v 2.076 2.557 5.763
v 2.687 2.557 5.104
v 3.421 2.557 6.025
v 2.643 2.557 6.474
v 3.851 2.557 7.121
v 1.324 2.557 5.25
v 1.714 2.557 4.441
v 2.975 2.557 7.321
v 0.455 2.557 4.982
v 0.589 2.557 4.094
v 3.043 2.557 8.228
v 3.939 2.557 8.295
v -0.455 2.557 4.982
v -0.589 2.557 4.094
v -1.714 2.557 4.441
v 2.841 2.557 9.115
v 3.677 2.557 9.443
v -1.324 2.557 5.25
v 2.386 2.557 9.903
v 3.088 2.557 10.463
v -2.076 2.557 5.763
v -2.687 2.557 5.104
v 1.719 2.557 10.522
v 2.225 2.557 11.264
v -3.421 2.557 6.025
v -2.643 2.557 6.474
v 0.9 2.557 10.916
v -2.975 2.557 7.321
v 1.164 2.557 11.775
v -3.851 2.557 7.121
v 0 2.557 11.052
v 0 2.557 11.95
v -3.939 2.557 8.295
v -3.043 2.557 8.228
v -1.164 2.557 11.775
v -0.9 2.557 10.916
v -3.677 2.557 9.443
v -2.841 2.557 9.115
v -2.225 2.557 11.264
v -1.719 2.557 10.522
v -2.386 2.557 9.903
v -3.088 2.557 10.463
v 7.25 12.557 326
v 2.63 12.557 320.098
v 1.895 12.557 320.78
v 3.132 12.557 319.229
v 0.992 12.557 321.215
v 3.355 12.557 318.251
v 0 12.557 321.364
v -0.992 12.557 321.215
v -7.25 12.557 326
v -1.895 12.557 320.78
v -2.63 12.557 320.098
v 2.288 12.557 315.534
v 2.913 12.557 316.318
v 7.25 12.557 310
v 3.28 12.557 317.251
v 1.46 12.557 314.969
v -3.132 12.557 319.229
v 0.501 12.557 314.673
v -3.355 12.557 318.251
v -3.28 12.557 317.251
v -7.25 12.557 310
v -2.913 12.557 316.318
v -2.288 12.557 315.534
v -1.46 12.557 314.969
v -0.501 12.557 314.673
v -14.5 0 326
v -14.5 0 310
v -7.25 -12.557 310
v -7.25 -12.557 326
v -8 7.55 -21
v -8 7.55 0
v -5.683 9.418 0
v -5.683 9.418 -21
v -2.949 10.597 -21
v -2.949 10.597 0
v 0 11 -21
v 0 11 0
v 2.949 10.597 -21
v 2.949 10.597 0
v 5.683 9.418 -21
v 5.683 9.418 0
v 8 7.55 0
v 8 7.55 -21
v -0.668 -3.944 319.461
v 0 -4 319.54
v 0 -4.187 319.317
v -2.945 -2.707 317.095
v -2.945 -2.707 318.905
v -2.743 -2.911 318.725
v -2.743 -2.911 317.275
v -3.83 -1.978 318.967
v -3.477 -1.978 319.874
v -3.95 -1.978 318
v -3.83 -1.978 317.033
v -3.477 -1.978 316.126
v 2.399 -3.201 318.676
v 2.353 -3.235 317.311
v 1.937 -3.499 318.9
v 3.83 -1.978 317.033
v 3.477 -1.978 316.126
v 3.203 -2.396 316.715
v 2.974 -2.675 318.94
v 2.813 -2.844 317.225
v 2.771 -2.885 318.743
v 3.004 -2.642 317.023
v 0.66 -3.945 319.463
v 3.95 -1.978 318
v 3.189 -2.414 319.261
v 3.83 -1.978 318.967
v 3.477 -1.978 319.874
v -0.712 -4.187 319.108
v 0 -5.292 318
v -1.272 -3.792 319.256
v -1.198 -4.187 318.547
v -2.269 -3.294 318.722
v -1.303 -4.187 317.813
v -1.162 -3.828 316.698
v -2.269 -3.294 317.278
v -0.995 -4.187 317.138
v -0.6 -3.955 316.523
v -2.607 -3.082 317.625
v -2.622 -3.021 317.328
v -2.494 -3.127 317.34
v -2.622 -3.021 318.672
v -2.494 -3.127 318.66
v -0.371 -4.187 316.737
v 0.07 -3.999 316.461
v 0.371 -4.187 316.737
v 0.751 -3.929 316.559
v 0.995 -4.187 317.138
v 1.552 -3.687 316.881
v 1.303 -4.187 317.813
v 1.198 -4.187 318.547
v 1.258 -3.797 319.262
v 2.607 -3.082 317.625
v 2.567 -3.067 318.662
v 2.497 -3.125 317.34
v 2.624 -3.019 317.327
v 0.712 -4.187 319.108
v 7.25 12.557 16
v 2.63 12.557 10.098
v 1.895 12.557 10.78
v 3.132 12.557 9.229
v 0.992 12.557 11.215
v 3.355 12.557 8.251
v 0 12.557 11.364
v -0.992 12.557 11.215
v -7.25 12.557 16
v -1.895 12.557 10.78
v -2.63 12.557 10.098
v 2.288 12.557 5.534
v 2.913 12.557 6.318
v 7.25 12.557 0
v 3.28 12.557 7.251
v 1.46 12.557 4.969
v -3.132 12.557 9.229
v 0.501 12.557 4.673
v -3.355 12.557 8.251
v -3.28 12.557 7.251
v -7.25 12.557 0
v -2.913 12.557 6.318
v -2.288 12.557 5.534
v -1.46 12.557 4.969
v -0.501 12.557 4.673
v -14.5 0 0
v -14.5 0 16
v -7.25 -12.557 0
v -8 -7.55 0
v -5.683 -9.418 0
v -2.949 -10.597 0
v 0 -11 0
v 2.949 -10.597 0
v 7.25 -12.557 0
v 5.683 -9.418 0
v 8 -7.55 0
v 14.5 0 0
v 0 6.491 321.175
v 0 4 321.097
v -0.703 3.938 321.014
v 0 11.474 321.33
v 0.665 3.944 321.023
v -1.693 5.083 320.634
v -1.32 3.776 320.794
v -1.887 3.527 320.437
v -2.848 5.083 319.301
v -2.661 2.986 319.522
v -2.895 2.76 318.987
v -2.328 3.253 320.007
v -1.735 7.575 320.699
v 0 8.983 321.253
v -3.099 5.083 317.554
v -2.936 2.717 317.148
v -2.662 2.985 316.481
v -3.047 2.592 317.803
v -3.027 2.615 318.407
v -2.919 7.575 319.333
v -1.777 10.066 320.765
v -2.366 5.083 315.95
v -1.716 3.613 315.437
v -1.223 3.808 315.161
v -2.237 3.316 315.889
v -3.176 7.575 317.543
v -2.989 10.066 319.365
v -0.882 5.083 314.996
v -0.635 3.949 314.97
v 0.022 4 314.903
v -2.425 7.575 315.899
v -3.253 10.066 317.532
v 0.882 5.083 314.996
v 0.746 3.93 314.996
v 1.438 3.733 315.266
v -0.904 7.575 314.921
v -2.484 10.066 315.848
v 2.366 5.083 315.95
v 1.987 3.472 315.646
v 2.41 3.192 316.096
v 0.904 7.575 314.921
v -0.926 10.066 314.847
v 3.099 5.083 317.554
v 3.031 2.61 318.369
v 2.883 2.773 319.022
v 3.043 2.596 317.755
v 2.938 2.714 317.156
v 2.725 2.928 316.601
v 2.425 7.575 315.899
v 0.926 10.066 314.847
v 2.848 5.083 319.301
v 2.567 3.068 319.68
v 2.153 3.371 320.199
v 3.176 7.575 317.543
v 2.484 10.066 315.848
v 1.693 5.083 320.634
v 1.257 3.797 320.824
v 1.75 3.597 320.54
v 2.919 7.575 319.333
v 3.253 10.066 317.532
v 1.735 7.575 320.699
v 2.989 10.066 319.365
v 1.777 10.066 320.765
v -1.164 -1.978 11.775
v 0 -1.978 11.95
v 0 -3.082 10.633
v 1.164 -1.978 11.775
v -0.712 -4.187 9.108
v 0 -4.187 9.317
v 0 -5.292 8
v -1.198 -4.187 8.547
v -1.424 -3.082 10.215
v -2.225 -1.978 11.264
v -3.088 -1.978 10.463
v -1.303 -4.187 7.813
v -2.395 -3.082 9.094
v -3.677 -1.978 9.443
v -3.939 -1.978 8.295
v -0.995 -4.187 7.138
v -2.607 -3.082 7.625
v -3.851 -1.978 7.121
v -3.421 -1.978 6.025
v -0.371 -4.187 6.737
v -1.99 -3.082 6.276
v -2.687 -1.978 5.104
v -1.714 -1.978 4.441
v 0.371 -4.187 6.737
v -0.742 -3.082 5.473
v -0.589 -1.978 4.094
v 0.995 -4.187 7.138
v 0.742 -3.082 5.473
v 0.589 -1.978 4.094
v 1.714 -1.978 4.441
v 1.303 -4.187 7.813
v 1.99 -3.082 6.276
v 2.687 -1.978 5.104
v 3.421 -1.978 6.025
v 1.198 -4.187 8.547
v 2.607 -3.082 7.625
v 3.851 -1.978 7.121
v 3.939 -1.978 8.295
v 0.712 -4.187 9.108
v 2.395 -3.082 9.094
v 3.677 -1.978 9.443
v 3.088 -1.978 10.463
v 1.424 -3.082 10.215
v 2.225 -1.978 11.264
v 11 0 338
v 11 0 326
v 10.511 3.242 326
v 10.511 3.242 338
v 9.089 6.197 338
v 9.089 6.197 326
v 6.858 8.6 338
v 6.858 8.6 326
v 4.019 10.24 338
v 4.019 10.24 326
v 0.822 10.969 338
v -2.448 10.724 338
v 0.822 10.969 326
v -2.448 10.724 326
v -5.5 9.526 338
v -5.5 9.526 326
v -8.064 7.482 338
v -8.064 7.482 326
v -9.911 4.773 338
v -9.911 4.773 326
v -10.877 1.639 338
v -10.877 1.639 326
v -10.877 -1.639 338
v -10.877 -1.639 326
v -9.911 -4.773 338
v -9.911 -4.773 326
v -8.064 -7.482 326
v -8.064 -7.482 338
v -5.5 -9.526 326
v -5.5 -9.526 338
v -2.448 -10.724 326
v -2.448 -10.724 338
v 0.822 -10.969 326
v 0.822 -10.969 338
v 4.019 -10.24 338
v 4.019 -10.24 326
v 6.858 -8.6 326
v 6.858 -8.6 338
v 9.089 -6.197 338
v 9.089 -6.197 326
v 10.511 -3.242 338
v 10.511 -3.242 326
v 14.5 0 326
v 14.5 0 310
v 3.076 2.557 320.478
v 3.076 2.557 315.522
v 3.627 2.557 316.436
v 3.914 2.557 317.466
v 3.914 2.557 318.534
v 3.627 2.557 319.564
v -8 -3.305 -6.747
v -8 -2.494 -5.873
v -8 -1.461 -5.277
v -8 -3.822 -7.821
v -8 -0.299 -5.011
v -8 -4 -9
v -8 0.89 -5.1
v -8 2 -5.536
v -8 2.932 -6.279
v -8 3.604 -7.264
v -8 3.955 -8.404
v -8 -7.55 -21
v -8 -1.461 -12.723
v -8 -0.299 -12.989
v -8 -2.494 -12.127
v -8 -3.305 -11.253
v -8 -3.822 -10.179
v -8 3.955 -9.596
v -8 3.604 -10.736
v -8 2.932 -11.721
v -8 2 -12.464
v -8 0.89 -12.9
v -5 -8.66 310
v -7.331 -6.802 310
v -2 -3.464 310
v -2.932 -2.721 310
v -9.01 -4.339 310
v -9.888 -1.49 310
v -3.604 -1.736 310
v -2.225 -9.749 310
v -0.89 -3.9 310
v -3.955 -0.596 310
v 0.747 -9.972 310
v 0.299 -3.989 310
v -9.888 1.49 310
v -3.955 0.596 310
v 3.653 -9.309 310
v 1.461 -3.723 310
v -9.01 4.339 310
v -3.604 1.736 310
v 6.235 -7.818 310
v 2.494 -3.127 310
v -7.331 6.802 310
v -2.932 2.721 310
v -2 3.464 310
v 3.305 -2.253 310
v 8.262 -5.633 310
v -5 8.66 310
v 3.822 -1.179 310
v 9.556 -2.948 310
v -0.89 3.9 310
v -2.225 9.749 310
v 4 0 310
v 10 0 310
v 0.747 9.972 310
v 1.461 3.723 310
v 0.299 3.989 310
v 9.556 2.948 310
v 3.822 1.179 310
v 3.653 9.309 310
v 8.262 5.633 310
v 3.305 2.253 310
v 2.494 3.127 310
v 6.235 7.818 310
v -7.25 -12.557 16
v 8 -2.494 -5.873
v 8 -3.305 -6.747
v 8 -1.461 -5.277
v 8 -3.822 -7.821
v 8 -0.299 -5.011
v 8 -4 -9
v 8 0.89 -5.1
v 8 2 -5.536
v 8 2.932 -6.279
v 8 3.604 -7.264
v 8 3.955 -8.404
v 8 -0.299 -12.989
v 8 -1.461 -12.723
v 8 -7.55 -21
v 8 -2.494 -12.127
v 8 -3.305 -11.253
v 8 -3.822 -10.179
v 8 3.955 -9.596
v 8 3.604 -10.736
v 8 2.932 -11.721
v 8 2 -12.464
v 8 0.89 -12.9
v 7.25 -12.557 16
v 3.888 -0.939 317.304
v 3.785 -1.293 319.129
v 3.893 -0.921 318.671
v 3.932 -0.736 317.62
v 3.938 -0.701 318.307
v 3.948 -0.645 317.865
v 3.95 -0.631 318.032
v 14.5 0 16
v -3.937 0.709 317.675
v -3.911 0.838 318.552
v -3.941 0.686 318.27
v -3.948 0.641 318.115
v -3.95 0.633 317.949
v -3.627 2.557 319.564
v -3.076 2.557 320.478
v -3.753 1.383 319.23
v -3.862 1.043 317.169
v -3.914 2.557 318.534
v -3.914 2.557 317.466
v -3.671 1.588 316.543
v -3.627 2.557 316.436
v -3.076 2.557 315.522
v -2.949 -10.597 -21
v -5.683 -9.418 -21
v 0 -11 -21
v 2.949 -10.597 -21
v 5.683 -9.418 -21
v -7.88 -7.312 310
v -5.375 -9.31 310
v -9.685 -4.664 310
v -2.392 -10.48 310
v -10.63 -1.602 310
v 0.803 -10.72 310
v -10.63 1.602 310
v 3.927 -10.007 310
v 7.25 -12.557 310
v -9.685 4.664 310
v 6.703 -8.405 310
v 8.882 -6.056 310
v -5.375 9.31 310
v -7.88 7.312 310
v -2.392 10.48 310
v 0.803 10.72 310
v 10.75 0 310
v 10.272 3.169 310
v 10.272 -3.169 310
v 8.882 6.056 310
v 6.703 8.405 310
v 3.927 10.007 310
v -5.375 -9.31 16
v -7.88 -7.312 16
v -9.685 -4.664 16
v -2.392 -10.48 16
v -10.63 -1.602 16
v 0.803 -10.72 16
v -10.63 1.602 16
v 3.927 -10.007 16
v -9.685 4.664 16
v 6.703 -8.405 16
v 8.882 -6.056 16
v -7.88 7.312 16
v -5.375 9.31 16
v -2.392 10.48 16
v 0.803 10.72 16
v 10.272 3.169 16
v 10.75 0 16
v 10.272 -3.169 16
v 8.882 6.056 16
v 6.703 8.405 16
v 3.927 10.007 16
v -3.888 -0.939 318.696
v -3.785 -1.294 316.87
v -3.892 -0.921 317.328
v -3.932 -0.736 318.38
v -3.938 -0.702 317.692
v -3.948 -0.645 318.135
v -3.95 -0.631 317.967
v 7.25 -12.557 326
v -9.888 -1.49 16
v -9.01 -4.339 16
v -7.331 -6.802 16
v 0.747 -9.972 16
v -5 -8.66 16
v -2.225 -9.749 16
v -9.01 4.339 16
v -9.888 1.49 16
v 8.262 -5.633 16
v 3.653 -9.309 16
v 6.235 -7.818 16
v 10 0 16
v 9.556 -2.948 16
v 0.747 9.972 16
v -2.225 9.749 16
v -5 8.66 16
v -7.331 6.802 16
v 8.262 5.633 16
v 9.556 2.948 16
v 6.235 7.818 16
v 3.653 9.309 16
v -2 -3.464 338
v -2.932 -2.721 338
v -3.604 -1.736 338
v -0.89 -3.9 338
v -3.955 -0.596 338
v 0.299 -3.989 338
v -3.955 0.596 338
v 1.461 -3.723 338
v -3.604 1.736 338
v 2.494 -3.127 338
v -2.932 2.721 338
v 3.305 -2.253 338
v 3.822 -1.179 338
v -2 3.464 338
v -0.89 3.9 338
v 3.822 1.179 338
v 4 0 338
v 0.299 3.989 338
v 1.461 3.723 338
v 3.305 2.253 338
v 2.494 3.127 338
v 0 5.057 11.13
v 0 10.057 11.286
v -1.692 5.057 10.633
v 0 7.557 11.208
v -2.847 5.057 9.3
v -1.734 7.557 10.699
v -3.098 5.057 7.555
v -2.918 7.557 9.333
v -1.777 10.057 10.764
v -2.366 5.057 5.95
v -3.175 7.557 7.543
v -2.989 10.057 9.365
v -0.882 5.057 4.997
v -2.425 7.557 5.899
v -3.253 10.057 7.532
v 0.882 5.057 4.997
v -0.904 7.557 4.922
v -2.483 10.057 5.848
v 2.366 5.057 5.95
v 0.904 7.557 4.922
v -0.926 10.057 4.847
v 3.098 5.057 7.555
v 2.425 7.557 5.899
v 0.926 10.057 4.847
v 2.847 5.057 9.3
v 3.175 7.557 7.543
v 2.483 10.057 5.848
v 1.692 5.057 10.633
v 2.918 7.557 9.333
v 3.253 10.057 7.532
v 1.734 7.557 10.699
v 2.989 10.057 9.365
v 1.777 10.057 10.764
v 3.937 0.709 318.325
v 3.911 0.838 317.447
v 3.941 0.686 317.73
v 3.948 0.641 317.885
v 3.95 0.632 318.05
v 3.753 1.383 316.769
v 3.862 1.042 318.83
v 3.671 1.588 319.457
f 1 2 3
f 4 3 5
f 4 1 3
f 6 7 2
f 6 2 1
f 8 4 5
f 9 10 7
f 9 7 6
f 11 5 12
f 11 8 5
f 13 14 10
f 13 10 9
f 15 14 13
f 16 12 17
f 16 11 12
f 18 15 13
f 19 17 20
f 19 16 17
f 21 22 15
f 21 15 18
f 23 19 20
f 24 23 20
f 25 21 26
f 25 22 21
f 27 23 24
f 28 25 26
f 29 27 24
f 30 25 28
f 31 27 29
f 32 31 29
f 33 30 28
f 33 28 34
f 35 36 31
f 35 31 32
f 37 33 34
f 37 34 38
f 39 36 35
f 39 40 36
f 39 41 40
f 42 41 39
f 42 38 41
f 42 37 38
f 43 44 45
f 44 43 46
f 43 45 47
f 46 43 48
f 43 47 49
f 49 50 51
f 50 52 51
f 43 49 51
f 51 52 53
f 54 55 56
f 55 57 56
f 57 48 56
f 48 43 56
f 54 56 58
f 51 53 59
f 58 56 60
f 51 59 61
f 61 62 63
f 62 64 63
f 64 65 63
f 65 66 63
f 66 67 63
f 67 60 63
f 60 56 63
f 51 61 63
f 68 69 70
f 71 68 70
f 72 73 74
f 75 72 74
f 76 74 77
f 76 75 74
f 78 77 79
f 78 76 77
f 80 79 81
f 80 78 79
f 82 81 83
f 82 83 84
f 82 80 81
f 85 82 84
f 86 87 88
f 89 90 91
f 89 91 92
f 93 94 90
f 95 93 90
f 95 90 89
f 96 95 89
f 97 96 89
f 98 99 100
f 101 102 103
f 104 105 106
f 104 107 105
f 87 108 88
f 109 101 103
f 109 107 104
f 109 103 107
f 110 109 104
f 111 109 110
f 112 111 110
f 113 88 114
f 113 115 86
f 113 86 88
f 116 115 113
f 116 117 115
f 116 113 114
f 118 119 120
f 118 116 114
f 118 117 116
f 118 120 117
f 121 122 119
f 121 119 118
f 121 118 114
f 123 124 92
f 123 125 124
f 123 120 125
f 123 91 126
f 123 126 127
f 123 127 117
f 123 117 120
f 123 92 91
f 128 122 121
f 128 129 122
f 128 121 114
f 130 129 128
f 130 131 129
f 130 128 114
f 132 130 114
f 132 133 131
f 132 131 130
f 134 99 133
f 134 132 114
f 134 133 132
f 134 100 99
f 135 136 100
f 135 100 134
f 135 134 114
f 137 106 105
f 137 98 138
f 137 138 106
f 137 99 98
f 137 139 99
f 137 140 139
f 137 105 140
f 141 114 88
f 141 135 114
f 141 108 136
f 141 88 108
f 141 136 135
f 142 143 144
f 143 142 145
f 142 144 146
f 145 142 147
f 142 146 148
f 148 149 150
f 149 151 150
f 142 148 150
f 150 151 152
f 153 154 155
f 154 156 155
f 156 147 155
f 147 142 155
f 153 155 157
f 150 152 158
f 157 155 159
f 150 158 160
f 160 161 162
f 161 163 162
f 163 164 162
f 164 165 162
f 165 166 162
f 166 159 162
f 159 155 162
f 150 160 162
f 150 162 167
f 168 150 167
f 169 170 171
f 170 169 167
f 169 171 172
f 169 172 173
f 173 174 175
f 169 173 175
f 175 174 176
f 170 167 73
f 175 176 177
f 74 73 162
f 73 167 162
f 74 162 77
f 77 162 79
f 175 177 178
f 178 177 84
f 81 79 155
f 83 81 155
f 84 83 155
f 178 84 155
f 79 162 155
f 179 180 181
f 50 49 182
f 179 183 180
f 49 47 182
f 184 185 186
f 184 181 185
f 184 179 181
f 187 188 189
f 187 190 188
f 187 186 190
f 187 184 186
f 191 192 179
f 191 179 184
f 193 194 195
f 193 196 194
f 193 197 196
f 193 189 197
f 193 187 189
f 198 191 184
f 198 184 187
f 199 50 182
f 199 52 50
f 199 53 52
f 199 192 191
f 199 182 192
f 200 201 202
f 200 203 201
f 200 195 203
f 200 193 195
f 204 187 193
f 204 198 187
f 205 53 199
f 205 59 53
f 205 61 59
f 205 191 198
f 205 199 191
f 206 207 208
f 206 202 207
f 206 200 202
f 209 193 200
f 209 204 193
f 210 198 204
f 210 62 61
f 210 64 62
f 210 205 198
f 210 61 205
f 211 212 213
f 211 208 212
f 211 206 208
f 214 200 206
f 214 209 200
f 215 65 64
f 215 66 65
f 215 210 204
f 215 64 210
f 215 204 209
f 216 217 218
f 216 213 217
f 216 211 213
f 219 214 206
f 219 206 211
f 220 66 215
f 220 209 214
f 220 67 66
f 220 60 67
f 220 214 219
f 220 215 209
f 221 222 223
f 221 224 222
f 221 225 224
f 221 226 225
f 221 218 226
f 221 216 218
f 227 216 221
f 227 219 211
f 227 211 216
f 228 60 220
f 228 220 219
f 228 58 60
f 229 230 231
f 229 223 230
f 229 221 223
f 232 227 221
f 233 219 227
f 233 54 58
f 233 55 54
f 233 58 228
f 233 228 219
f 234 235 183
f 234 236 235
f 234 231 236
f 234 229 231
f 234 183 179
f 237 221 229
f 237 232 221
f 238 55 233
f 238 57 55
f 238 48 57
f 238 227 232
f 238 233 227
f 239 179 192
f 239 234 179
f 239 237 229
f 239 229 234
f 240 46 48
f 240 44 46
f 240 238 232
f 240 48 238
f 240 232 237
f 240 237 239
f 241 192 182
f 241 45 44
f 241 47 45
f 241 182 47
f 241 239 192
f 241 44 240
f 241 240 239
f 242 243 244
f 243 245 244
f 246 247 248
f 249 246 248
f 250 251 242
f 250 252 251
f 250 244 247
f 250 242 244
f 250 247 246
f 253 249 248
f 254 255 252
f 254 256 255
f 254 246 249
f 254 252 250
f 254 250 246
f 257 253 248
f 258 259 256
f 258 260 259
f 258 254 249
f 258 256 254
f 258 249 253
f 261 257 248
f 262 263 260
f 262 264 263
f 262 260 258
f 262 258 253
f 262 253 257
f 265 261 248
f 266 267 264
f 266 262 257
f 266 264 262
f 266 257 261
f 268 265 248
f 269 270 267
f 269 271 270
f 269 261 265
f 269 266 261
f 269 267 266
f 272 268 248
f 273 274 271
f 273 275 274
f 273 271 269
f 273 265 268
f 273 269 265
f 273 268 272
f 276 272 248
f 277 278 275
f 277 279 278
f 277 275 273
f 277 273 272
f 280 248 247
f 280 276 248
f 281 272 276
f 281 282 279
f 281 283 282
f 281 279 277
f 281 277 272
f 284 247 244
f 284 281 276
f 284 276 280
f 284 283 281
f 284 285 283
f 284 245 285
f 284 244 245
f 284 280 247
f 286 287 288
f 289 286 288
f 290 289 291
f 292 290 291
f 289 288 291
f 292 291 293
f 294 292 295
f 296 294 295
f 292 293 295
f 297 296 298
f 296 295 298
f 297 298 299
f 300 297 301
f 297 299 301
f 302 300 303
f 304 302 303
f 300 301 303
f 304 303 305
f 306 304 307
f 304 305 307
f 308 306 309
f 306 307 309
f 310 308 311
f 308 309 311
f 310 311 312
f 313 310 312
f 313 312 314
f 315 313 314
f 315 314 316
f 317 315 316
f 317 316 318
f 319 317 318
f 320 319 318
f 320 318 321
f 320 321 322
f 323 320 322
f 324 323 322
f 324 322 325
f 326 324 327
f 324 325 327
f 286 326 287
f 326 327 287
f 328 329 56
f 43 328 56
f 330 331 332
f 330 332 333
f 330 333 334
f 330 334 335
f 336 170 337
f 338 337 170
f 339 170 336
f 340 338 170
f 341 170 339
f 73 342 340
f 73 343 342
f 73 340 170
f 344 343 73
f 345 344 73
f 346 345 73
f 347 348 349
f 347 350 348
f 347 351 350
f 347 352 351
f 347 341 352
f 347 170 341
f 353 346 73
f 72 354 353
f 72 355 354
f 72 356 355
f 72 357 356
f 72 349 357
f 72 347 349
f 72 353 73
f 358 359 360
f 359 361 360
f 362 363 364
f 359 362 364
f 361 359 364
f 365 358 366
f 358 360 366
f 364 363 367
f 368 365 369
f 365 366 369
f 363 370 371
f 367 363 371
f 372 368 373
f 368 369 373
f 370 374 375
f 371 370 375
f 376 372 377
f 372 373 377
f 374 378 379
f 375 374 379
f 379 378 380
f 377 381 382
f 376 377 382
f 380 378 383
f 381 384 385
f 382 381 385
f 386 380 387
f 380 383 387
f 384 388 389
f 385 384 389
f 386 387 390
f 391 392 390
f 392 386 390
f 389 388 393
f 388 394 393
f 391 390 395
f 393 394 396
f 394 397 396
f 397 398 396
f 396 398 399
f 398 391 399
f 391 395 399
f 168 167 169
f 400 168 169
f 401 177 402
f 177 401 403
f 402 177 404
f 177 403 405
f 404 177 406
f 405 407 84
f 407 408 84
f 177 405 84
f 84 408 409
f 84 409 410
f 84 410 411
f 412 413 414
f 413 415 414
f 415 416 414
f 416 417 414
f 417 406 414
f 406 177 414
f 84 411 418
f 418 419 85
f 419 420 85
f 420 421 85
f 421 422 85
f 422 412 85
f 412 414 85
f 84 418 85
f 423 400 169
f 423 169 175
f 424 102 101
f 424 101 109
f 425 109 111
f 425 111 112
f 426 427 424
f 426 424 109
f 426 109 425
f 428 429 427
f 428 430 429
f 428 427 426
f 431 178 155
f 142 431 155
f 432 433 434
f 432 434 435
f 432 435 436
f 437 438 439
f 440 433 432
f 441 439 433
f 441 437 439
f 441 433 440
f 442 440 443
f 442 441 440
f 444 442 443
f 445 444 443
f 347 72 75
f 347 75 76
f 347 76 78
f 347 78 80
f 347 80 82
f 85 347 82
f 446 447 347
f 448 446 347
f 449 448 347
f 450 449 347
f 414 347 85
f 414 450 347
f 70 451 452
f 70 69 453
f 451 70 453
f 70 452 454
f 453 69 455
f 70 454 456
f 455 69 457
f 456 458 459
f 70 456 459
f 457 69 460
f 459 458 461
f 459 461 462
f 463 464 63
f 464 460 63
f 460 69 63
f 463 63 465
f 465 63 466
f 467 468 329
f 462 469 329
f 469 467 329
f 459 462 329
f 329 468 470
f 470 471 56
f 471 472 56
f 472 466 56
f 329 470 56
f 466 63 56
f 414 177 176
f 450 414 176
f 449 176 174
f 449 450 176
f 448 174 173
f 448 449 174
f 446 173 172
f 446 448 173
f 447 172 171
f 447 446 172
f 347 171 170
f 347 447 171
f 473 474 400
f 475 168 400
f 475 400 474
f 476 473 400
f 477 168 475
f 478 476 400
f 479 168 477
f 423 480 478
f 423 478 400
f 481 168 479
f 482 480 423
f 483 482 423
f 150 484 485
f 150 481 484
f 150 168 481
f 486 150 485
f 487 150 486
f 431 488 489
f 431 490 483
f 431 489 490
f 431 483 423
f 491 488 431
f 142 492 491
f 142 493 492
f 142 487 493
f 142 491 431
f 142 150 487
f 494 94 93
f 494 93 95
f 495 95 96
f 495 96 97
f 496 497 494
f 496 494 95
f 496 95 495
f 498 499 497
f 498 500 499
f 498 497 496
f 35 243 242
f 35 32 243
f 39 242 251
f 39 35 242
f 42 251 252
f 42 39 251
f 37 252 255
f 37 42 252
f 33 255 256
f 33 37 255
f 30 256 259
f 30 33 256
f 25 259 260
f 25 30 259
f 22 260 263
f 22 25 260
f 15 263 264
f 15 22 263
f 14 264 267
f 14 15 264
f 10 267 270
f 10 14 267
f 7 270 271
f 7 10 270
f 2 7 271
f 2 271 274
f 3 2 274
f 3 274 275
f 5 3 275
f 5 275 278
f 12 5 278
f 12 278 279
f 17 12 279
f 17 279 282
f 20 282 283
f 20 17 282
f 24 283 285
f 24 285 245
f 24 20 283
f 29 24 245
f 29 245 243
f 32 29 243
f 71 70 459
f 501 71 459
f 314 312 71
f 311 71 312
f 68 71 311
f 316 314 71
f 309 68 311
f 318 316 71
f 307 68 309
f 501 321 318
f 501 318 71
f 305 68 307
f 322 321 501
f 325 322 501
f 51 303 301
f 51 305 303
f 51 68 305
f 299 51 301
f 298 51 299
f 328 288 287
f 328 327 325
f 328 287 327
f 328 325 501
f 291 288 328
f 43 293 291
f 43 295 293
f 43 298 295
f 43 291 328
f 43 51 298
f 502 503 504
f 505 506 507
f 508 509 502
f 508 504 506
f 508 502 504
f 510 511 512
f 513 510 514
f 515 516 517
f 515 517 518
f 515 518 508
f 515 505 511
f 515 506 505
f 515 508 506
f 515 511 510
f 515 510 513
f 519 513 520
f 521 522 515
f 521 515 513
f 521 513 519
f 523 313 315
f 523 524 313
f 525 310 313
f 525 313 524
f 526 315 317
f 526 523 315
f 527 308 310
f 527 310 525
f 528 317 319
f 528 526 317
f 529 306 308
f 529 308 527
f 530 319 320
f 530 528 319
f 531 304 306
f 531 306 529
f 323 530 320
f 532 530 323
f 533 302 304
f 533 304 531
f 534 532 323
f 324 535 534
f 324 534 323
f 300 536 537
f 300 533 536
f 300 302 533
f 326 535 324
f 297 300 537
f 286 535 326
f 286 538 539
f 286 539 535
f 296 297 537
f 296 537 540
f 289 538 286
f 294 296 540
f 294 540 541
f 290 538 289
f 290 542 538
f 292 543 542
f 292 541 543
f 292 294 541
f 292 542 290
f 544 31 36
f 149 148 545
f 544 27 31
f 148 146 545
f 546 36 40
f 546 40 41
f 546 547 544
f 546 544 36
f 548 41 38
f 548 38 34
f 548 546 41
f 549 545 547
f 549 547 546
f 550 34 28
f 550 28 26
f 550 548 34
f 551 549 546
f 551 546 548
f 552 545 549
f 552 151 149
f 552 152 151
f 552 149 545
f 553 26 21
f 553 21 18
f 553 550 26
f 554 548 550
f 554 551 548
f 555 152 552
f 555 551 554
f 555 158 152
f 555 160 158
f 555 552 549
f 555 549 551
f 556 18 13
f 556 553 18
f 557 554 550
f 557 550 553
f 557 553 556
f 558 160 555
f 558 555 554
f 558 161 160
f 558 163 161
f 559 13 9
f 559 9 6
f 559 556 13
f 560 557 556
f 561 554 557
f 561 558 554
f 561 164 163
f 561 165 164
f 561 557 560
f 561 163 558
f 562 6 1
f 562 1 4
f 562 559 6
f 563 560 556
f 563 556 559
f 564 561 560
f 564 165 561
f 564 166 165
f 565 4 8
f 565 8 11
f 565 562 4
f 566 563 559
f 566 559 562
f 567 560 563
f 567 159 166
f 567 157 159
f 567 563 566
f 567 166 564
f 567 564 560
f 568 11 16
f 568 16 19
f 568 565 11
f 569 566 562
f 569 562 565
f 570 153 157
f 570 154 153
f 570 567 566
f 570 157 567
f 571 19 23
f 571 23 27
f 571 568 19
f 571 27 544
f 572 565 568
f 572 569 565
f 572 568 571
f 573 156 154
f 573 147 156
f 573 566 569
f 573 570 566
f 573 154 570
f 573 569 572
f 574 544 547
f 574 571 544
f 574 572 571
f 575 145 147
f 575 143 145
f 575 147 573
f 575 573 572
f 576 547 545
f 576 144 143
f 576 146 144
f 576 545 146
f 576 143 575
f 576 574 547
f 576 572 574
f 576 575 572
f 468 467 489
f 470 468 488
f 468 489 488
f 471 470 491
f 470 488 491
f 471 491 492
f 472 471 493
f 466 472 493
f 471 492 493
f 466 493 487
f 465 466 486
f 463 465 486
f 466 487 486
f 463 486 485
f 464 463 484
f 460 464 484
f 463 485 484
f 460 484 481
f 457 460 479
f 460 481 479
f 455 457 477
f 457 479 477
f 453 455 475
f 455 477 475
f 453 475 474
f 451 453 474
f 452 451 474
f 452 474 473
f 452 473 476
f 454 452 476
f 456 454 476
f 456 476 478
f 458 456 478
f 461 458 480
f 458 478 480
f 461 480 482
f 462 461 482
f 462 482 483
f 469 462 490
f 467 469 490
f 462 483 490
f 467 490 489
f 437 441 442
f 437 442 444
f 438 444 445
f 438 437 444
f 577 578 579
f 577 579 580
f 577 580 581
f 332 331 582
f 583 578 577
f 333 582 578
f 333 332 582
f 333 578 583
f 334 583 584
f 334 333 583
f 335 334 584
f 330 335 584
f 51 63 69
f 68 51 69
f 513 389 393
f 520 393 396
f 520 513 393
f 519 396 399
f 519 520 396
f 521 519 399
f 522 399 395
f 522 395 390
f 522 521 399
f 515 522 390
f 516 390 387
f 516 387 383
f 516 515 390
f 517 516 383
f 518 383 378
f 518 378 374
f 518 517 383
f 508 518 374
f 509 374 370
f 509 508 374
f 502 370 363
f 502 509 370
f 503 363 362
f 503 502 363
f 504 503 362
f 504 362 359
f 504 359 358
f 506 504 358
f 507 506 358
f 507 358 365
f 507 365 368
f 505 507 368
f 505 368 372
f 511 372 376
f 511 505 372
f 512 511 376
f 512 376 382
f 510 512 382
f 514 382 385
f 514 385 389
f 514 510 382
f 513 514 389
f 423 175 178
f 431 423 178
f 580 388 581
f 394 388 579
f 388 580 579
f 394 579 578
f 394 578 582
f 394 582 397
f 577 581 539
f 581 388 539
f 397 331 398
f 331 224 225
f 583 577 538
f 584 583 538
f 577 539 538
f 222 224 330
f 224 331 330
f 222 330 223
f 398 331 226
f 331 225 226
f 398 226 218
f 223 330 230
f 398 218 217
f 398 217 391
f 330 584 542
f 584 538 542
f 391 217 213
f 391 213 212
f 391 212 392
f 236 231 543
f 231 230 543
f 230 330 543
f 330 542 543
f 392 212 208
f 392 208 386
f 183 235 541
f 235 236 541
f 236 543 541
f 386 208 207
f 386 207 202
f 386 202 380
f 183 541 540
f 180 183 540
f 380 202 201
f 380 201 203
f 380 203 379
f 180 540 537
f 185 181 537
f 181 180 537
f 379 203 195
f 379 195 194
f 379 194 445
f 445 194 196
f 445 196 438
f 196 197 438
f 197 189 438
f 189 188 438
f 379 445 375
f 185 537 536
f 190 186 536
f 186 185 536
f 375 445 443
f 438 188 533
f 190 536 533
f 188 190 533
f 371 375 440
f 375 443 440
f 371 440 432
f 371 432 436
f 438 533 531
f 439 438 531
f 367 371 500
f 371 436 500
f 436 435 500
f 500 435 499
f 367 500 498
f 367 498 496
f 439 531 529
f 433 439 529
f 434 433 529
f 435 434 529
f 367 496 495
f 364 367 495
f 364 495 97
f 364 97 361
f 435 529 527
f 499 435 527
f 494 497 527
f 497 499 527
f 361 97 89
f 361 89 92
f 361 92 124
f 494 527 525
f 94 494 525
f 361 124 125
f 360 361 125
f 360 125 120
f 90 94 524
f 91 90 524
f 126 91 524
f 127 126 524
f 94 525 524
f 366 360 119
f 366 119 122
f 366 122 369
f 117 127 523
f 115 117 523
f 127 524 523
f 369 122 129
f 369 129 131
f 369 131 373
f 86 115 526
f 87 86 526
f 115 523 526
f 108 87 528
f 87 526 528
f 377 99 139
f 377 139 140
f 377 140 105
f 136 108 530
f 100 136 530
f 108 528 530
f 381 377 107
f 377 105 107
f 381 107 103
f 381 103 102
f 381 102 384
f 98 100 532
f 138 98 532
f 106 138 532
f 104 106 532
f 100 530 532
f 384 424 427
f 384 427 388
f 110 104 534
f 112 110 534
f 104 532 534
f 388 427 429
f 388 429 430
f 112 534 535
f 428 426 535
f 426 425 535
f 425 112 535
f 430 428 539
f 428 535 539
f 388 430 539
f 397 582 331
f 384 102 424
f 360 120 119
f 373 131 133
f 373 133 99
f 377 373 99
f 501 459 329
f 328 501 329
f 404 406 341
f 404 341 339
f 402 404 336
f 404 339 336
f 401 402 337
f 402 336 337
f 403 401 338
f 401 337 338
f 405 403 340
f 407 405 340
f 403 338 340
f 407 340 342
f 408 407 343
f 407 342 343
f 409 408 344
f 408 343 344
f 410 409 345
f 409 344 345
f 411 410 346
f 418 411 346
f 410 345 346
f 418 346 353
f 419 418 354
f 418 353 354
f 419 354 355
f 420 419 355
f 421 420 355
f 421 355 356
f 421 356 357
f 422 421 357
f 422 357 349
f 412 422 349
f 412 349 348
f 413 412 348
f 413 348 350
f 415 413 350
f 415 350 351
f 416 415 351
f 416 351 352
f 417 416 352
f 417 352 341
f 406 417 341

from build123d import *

# Parameters (mm, degrees)
EXTRUDE_1_DEPTH       = 16
SKETCH_3_R            = 10.75
SKETCH_3_R_2          = 10
EXTRUDE_3_DEPTH       = 294
EXTRUDE_4_DEPTH       = 16
F_1_8_RC_1_AT_2_COUNT = 2
F_1_8_RC_1_AT_2_PITCH = 310
SKETCH_8_R            = 11
EXTRUDE_5_DEPTH       = 12
SKETCH_9_R            = 4
CUT_EXTRUDE_1_DEPTH   = 50
EXTRUDE_START         = 21
SKETCH_10_R           = 11
EXTRUDE_6_DEPTH       = 21
SKETCH_11_R           = 22.5
SKETCH_11_W           = 16
SKETCH_11_H           = 30
CUT_EXTRUDE_2_DEPTH   = 21
SKETCH_12_R           = 4
CUT_EXTRUDE_3_DEPTH   = 339.980733332


with BuildPart() as part:
    # 草图1 → 凸台-拉伸1 (new body)
    with BuildSketch(Plane.XY):
        Polygon((14.5, 0), (7.25, 12.557368355), (-7.25, 12.557368355), (-14.5, 0), (-7.25, -12.557368355), (7.25, -12.557368355), align=None)
    extrude(amount=EXTRUDE_1_DEPTH)

    # 草图3 → 凸台-拉伸3 (add)
    with BuildSketch(Plane.XY.offset(16)):
        Circle(SKETCH_3_R)
        Circle(SKETCH_3_R_2, mode=Mode.SUBTRACT)
    extrude(amount=EXTRUDE_3_DEPTH)

    # 草图4 → 凸台-拉伸4 (add)
    with BuildSketch(Plane.XY.offset(310)):
        Polygon((14.5, 0), (7.25, 12.557368355), (-7.25, 12.557368355), (-14.5, 0), (-7.25, -12.557368355), (7.25, -12.557368355), align=None)
    extrude(amount=EXTRUDE_4_DEPTH)

    # 草图6 → 1/8 Rc 螺纹孔1 (revolve, cut)
    with BuildSketch(Plane(origin=(0, 12.557368355, 318), x_dir=(0, 0, 1), z_dir=(1, 0, 0))):
        Polygon((0, 0), (0, 17.849443543), (3.95, 14.535), (3.95, 10), (3.051996789, 10), (3.364163, 0), align=None)
    f_1_8_rc_1 = revolve(axis=Axis((0, 18.907368355, 318), (0, -1, 0)), mode=Mode.SUBTRACT)

    # 1/8 Rc 螺纹孔1 at 2: 1/8 Rc 螺纹孔1 ×2
    with Locations(*[(0, 0, -i * F_1_8_RC_1_AT_2_PITCH) for i in range(1, F_1_8_RC_1_AT_2_COUNT)]):
        add(f_1_8_rc_1, mode=Mode.SUBTRACT)

    # 草图8 → 凸台-拉伸5 (add)
    with BuildSketch(Plane.XY.offset(326)):
        Circle(SKETCH_8_R)
    extrude(amount=EXTRUDE_5_DEPTH)

    # 草图9 → 切除-拉伸1 (cut)
    with BuildSketch(Plane.XY.offset(338)):
        Circle(SKETCH_9_R)
    extrude(amount=-CUT_EXTRUDE_1_DEPTH, mode=Mode.SUBTRACT)

    # 草图10 → 凸台-拉伸6 (add)
    with BuildSketch(Plane(origin=(0, 0, 0), x_dir=(-1, 0, 0), z_dir=(0, 0, -1)).offset(EXTRUDE_START)):
        with Locations(Location((0, 0, 0), (0, 0, 180))):
            Circle(SKETCH_10_R)
    extrude(amount=-EXTRUDE_6_DEPTH)

    # 草图11 → 切除-拉伸2 (cut)
    with BuildSketch(Plane(origin=(0, 0, -21), x_dir=(-1, 0, 0), z_dir=(0, 0, -1))):
        Circle(SKETCH_11_R)
        Rectangle(SKETCH_11_W, SKETCH_11_H, mode=Mode.SUBTRACT)
    extrude(amount=-CUT_EXTRUDE_2_DEPTH, mode=Mode.SUBTRACT)

    # 草图12 → 切除-拉伸3 (cut, through all)
    with BuildSketch(Plane.ZY.offset(8)):
        with Locations(Location((-9, 0, 0), (0, 0, 270))):
            Circle(SKETCH_12_R)
    extrude(amount=-CUT_EXTRUDE_3_DEPTH, mode=Mode.SUBTRACT)


solid = part.part
